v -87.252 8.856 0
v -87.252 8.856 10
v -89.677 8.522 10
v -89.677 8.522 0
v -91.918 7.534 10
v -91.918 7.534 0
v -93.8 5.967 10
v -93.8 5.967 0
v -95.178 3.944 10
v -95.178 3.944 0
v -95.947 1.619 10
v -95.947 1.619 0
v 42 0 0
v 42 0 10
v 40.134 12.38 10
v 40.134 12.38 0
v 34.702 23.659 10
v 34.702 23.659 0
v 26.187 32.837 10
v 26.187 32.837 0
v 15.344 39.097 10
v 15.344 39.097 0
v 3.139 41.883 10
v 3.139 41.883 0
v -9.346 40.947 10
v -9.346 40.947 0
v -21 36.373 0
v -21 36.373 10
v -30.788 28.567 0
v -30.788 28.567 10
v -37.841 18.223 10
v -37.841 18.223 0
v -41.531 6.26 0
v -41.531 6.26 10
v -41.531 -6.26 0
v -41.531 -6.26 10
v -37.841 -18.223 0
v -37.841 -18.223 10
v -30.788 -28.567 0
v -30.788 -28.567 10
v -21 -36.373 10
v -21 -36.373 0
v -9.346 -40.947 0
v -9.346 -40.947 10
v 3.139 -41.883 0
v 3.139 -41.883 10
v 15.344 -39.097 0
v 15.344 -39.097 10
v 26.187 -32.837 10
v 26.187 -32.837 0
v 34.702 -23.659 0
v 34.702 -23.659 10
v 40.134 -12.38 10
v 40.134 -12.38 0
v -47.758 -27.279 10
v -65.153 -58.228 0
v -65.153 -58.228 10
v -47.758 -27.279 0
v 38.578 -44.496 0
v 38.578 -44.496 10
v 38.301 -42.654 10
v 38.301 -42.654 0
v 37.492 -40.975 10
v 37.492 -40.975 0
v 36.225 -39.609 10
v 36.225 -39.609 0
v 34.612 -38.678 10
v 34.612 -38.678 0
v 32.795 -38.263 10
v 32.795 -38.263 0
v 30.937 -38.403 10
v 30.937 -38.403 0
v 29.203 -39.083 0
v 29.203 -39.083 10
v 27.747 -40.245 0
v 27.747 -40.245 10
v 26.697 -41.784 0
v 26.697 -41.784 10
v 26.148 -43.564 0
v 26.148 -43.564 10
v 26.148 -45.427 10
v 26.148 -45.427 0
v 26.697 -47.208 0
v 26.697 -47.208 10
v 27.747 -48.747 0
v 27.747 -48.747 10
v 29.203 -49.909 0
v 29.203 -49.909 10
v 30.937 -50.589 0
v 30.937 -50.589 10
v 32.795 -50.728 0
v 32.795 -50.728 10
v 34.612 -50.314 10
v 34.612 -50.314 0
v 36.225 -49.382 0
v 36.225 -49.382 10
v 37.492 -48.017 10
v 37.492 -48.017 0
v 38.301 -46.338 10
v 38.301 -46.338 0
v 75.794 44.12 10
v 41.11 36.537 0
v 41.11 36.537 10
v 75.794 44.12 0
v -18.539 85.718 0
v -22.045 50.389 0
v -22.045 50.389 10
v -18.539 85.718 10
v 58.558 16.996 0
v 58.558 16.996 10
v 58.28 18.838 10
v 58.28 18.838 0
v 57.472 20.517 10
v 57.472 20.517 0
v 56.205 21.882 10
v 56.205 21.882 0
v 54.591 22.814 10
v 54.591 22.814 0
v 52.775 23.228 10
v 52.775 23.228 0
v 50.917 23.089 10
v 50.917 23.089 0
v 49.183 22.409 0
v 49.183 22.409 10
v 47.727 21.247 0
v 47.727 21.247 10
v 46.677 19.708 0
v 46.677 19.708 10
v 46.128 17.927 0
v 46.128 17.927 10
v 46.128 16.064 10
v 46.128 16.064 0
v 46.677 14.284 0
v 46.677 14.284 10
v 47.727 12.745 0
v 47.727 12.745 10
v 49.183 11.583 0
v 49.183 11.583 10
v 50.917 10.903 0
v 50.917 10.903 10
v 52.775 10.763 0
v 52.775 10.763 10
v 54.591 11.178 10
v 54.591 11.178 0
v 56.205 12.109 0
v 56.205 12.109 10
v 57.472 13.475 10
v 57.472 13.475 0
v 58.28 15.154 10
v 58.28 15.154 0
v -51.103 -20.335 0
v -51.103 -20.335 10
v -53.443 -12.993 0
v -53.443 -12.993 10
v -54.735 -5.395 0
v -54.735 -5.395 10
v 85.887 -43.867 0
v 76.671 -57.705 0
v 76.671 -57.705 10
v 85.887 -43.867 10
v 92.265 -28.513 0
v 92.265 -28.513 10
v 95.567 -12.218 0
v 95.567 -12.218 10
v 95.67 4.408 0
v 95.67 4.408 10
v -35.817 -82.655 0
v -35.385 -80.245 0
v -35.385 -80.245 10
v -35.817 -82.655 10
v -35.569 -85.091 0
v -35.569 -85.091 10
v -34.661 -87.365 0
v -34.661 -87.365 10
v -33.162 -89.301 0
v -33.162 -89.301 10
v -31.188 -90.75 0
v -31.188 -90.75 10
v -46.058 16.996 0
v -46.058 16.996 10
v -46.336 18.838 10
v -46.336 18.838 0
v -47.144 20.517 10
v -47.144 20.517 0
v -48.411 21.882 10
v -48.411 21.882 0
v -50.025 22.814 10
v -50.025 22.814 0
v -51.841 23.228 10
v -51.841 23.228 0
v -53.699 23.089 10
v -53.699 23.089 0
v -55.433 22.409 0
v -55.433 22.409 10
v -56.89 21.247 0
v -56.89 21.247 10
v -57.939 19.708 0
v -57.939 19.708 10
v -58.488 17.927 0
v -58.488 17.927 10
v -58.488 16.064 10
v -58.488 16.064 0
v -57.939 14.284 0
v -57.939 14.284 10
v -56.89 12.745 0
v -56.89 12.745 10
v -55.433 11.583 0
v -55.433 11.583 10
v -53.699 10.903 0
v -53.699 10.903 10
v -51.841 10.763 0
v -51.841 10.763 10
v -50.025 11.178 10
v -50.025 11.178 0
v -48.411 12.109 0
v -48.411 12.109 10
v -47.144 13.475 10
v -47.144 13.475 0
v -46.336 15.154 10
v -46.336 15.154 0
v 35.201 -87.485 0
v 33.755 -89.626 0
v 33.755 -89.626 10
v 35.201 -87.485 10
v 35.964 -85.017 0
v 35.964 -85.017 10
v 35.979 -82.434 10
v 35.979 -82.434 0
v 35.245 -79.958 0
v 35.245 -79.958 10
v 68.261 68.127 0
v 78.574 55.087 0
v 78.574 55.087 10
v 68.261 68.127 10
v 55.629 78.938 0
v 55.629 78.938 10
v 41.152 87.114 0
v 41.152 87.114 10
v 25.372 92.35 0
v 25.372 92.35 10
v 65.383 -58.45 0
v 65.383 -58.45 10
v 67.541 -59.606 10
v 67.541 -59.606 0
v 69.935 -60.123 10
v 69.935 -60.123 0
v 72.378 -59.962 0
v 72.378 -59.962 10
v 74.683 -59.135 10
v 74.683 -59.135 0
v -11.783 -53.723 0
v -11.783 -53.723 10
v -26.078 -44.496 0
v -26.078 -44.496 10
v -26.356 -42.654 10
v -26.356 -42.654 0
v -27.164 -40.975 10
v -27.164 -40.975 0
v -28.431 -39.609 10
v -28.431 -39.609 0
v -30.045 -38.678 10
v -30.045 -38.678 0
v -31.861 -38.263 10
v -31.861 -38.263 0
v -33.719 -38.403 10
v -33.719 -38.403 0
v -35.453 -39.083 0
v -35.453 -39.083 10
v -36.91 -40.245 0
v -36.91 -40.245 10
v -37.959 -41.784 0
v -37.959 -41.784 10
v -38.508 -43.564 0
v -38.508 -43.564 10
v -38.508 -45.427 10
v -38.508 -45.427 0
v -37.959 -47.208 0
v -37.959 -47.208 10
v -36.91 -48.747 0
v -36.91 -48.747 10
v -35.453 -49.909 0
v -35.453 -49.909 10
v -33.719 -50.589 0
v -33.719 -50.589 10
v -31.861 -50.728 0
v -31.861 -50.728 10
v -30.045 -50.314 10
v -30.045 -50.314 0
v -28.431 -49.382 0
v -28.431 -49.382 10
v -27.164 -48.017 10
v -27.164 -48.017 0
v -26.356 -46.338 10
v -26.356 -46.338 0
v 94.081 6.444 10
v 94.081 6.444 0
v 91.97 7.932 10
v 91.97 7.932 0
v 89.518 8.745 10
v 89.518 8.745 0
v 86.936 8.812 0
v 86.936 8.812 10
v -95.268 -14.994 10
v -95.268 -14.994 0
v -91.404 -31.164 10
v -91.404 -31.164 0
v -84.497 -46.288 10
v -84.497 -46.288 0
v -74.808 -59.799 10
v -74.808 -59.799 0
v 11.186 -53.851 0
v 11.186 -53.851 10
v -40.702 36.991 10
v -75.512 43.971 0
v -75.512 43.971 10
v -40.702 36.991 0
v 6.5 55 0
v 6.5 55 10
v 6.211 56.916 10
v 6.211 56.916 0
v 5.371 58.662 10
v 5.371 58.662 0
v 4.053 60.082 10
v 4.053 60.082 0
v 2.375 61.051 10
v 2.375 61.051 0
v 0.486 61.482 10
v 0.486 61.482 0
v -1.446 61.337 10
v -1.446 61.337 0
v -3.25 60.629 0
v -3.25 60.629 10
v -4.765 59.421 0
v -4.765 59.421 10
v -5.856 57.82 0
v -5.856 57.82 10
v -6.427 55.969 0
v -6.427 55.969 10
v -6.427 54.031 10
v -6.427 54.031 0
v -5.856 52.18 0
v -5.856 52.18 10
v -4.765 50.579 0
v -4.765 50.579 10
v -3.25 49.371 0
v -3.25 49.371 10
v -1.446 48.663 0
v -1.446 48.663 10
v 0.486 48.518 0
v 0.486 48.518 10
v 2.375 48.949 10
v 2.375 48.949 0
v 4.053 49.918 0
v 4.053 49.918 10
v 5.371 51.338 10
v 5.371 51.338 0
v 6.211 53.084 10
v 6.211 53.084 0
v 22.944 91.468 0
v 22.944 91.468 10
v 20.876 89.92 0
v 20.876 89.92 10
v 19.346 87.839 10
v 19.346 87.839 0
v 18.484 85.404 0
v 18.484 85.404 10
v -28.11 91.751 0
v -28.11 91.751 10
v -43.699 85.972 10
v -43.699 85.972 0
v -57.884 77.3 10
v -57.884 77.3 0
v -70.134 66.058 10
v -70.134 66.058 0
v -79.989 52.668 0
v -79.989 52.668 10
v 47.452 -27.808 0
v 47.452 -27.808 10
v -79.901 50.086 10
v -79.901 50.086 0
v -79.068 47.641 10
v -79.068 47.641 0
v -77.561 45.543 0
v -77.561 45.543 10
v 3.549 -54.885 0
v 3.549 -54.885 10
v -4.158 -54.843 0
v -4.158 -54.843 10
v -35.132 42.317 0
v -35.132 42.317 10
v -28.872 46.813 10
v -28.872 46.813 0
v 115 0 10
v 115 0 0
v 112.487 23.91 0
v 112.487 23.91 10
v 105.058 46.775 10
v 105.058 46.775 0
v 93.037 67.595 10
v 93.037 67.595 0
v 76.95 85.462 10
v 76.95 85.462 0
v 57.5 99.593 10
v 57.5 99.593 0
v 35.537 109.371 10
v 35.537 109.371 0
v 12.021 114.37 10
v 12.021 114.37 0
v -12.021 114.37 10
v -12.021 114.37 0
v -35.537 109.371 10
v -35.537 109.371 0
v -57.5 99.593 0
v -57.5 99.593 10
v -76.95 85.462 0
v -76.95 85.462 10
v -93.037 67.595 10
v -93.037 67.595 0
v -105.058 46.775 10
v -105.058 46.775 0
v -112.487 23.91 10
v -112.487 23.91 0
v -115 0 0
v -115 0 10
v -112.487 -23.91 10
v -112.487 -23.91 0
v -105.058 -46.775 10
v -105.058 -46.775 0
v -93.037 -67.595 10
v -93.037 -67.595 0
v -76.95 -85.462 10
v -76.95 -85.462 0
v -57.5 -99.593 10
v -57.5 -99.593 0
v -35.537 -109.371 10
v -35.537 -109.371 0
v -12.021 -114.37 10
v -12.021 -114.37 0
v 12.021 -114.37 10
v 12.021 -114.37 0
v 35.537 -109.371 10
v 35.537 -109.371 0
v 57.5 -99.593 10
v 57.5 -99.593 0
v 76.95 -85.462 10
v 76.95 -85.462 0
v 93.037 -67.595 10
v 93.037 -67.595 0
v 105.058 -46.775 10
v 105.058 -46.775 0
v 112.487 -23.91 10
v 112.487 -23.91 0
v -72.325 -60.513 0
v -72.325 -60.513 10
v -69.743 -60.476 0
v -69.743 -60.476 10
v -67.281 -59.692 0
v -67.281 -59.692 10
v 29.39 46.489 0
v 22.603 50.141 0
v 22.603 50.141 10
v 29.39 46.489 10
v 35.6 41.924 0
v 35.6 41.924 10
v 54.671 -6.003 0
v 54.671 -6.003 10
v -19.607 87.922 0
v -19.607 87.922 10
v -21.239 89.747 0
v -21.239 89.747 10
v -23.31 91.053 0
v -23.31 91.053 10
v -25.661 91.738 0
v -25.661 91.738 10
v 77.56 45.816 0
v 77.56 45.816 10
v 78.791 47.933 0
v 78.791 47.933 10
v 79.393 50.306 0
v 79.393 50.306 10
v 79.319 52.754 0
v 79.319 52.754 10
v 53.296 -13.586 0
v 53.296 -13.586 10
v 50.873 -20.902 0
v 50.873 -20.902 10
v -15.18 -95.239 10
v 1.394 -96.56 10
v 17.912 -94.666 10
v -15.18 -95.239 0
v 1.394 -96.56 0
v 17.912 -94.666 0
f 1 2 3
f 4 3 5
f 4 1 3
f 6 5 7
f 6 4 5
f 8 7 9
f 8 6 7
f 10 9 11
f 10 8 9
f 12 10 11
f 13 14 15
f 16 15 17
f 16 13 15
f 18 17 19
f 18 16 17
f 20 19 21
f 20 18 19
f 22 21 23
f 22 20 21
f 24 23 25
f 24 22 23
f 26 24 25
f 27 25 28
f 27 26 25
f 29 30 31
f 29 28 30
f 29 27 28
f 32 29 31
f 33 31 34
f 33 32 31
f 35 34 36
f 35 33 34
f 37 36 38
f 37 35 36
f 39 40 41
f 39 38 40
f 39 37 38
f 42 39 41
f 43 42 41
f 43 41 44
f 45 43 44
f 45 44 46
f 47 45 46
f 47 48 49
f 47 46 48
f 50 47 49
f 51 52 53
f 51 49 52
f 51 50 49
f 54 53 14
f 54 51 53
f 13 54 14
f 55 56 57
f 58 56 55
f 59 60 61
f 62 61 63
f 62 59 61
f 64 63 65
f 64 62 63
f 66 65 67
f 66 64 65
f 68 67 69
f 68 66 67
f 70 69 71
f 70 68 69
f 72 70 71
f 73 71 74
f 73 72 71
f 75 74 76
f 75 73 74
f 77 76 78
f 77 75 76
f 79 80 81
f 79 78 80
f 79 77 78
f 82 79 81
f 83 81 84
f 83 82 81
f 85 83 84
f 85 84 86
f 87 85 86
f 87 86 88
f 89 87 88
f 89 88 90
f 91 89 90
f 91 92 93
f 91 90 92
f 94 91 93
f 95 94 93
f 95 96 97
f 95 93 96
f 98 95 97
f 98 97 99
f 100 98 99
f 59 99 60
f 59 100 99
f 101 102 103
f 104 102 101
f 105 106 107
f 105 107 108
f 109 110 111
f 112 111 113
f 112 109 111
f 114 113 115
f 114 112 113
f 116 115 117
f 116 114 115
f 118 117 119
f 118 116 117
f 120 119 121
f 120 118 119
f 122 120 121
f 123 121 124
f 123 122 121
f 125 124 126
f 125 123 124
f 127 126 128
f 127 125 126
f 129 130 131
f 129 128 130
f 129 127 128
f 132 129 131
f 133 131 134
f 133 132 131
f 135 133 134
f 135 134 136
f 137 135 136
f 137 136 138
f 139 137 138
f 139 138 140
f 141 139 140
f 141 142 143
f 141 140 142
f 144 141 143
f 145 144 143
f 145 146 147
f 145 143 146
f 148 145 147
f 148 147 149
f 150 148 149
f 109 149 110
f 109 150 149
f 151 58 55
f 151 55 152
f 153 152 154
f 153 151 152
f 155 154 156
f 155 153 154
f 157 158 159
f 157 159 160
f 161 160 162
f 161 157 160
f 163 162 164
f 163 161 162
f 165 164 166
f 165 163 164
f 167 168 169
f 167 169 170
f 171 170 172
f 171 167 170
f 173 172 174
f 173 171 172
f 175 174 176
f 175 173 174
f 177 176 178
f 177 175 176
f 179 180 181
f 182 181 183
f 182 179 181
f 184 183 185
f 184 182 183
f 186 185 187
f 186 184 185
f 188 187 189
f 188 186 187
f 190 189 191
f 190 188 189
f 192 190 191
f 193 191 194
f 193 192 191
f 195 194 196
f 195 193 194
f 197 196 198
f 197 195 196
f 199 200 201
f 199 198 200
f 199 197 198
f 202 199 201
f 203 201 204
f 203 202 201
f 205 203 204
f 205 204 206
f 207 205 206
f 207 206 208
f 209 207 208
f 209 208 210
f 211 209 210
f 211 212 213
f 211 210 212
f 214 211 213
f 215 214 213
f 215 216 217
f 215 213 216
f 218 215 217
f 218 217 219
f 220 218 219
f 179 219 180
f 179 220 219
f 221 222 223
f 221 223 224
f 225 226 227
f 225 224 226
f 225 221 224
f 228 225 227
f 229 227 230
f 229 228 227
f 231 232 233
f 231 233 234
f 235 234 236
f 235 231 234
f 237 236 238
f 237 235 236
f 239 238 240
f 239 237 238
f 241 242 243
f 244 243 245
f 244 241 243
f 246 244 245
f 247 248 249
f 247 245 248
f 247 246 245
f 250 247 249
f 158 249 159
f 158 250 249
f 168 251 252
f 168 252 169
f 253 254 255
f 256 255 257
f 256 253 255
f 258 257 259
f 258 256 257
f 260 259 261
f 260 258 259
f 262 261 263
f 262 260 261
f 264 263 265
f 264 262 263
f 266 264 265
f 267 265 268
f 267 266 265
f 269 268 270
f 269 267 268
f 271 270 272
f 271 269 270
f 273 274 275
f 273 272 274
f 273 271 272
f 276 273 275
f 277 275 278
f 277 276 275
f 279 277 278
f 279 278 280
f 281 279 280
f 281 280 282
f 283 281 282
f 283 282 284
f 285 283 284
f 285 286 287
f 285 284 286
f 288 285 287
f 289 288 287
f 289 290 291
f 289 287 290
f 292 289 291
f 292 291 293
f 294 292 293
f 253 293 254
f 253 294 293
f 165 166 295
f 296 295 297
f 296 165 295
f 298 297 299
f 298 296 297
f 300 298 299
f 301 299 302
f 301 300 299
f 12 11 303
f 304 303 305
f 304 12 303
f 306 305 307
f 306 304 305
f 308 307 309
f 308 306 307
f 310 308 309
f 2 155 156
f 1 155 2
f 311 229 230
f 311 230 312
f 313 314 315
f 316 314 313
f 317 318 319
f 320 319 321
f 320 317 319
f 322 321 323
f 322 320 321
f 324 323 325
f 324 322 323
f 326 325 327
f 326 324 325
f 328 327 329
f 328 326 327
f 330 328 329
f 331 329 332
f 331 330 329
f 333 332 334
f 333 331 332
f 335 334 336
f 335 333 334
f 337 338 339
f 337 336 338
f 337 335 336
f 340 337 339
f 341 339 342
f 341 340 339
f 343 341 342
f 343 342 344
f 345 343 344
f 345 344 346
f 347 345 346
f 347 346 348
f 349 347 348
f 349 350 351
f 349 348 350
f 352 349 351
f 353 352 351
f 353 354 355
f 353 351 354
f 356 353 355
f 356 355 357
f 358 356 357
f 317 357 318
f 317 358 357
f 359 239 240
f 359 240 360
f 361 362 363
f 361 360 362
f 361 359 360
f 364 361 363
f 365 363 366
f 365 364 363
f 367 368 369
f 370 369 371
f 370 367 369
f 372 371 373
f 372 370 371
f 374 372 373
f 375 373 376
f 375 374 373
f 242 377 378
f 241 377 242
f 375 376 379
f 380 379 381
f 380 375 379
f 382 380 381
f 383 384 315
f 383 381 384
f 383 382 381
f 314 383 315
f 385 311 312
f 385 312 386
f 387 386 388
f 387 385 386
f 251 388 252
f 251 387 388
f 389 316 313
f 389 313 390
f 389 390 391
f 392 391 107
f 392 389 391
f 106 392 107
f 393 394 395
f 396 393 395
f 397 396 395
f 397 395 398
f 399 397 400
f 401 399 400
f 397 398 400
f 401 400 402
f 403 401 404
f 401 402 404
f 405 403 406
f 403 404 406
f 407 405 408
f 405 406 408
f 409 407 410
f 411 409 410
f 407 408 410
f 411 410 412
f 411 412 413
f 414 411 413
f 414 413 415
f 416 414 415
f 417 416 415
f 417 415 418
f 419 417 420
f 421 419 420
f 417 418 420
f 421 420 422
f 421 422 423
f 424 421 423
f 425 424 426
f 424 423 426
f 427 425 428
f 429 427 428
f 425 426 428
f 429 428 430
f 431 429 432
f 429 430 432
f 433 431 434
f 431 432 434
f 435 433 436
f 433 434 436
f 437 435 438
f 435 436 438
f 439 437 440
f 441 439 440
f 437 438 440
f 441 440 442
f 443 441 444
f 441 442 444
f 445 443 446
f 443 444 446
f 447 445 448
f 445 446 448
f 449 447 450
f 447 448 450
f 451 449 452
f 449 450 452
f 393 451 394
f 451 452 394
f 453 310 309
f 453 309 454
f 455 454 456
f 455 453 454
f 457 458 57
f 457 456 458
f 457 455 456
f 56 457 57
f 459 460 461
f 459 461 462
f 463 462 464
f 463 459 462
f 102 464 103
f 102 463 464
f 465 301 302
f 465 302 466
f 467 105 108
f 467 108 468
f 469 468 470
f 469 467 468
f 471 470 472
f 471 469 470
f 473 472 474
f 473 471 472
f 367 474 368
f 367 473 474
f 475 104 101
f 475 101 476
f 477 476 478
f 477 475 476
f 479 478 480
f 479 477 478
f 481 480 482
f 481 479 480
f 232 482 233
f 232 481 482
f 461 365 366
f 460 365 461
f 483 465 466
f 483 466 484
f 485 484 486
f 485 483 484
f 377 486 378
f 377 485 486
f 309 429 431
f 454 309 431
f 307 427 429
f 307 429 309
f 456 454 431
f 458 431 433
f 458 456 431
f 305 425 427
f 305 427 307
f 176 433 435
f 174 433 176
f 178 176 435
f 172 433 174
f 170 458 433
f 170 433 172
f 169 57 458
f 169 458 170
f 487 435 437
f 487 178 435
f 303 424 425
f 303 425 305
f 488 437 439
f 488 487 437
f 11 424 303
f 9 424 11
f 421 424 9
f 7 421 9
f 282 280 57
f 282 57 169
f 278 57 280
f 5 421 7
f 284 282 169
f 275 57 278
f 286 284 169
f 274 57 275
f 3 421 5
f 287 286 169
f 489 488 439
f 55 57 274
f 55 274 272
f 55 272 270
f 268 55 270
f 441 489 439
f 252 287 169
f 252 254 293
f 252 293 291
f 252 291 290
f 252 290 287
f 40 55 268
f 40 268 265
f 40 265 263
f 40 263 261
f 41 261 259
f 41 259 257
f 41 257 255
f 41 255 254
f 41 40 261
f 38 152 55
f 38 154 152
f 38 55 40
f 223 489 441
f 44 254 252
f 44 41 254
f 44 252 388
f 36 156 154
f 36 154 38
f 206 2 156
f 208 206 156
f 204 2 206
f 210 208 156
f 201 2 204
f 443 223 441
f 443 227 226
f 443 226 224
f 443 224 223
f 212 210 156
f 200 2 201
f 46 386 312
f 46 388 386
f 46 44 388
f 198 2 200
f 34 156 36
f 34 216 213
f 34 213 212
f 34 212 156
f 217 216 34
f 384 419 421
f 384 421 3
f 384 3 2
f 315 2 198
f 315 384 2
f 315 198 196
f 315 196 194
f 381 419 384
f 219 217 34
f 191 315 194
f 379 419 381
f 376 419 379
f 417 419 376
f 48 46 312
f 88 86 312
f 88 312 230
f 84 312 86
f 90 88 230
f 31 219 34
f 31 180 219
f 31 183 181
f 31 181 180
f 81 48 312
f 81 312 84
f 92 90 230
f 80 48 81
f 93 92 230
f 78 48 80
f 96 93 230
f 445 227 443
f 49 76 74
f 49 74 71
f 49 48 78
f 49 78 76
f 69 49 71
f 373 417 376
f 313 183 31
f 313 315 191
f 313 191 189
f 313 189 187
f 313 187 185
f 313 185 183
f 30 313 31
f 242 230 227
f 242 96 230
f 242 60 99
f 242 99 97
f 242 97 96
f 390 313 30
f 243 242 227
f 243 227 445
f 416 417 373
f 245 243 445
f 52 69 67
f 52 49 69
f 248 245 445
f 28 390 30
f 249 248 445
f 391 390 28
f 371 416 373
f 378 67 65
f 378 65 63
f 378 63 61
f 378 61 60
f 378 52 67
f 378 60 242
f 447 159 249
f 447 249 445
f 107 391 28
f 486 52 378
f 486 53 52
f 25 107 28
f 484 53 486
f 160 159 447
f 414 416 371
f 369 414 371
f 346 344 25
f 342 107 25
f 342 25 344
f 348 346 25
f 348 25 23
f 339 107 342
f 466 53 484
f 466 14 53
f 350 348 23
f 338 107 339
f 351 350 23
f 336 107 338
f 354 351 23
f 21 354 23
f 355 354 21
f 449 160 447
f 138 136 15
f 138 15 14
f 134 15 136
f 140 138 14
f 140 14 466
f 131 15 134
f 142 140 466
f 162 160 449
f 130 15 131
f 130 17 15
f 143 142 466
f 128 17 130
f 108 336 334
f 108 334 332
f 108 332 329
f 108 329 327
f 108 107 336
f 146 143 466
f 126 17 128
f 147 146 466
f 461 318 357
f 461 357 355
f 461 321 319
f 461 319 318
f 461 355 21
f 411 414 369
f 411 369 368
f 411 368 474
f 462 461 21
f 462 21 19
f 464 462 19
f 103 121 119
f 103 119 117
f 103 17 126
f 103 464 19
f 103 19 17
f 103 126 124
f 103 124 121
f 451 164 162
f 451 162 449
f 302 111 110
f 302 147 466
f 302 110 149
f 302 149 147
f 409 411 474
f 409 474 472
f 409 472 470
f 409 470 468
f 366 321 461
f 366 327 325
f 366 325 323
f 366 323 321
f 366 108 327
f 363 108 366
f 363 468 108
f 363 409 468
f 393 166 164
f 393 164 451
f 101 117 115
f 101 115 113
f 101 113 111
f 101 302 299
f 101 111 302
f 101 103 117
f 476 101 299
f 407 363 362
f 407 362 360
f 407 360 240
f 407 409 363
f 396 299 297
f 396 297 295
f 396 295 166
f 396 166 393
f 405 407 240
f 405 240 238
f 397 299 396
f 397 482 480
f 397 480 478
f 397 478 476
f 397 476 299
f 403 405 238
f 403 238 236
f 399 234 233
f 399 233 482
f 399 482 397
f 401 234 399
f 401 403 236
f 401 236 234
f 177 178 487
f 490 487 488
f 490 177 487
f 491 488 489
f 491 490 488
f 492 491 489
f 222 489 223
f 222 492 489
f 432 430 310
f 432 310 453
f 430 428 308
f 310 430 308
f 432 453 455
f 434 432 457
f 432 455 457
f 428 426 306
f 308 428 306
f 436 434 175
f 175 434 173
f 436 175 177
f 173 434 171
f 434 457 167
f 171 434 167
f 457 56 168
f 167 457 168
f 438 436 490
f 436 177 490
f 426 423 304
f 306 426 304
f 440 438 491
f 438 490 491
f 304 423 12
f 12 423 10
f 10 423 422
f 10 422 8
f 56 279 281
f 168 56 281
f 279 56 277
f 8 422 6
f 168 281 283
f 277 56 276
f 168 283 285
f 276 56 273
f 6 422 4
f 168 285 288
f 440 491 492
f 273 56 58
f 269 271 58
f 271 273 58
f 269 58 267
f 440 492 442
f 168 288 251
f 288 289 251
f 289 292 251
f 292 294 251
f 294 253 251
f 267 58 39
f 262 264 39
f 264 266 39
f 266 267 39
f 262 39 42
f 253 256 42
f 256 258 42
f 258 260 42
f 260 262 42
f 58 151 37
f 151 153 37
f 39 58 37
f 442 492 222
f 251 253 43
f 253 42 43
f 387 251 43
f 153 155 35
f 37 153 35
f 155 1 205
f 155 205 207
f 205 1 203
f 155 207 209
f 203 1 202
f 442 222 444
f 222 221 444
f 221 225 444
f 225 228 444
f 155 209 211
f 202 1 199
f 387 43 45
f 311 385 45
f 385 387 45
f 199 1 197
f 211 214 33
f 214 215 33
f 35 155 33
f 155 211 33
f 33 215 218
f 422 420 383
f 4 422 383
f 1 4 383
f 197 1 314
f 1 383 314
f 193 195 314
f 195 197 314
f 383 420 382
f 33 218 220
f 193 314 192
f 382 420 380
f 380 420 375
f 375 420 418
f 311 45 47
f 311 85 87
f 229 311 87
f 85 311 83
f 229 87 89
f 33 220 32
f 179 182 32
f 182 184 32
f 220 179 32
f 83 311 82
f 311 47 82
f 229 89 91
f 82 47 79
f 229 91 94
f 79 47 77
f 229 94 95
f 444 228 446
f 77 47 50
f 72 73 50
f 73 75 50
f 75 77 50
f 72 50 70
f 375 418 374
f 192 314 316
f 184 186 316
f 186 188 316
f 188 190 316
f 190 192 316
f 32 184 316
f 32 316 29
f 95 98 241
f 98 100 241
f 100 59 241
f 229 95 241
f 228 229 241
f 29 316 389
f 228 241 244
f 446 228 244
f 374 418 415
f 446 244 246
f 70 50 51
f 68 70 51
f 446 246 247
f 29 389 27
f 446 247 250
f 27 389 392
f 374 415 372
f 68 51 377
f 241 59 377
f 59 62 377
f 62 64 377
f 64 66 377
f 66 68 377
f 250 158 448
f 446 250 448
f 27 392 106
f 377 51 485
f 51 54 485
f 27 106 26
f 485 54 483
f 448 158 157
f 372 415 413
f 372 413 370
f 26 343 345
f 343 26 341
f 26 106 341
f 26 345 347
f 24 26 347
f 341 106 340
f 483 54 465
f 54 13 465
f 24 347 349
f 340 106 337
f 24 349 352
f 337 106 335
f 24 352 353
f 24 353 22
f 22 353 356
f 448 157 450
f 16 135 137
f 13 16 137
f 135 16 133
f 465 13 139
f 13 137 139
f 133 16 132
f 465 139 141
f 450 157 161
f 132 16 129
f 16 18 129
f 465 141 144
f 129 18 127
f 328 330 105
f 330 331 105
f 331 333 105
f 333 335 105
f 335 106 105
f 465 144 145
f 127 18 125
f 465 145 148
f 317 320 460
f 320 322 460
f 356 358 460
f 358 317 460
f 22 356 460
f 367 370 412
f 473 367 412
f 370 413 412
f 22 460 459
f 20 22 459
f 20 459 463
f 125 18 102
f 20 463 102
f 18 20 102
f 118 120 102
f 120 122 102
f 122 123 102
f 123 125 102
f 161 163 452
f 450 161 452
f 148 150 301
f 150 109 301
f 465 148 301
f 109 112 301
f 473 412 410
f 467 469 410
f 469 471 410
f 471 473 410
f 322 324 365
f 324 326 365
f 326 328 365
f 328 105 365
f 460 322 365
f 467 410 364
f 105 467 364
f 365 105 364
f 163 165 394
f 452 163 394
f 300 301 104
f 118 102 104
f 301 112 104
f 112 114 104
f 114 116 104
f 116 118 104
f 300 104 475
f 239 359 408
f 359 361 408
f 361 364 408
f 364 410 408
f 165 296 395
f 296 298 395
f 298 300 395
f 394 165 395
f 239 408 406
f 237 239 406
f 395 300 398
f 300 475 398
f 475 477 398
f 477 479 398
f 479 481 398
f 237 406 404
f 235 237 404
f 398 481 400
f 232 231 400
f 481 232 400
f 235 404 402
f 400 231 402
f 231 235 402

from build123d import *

# Parameters (mm, degrees)
SKETCH1_R           = 115
BOSS_EXTRUDE1_DEPTH = 10
SKETCH3_R           = 6.25
SKETCH3_R_2         = 6.5
SKETCH3_R_3         = 42
CUT_EXTRUDE2_DEPTH  = 163.941707368


with BuildPart() as part:
    # Sketch1 → Boss-Extrude1 (new body)
    with BuildSketch(Plane.XY):
        Circle(SKETCH1_R)
    extrude(amount=BOSS_EXTRUDE1_DEPTH)

    # Sketch3 → Cut-Extrude2 (cut, through all)
    with BuildSketch(Plane.XY):
        with BuildLine():
            Line((18.484325558, 85.403687954), (22.603174126, 50.140767041))
            ThreePointArc((22.603174126, 50.140767041), (32.574916184, 44.315627442), (41.110477128, 36.536675688))
            Line((41.110477128, 36.536675688), (75.793703221, 44.120364278))
            ThreePointArc((75.793703221, 44.120364278), (79.175021421, 49.09862209), (78.573775649, 55.086515471))
            ThreePointArc((78.573775649, 55.086515471), (55.629022762, 78.938176107), (25.371814654, 92.349542839))
            ThreePointArc((25.371814654, 92.349542839), (20.87622799, 89.919618918), (18.484325558, 85.403687954))
        make_face()
        with BuildLine():
            ThreePointArc((-40.701938294, 36.991245168), (-32.080463562, 44.674868301), (-22.044607418, 50.388840866))
            Line((-22.044607418, 50.388840866), (-18.539417586, 85.718037702))
            ThreePointArc((-18.539417586, 85.718037702), (-22.229137331, 90.472228676), (-28.109757511, 91.750770782))
            ThreePointArc((-28.109757511, 91.750770782), (-57.884353357, 77.299582515), (-79.989312588, 52.667607817))
            ThreePointArc((-79.989312588, 52.667607817), (-79.067530287, 47.641163039), (-75.511763217, 43.970829232))
            Line((-75.511763217, 43.970829232), (-40.701938294, 36.991245168))
        make_face()
        with BuildLine():
            ThreePointArc((-47.7583554, -27.278920241), (-52.40173304, -16.70504039), (-54.73479378, -5.394659379))
            Line((-54.73479378, -5.394659379), (-87.251693421, 8.856296471))
            ThreePointArc((-87.251693421, 8.856296471), (-92.913383832, 6.81629027), (-95.946561206, 1.618579367))
            ThreePointArc((-95.946561206, 1.618579367), (-91.403520553, -31.164406796), (-74.80792857, -59.799171102))
            ThreePointArc((-74.80792857, -59.799171102), (-69.742649114, -60.475760896), (-65.153161777, -58.228220975))
            Line((-65.153161777, -58.228220975), (-47.7583554, -27.278920241))
        make_face()
        with BuildLine():
            ThreePointArc((11.18565141, -53.850545053), (-0.305588527, -54.999151045), (-11.783355506, -53.72292372))
            Line((-11.783355506, -53.72292372), (-35.385094524, -80.244545469))
            ThreePointArc((-35.385094524, -80.244545469), (-35.194491887, -86.259529612), (-31.188478418, -90.75043372))
            ThreePointArc((-31.188478418, -90.75043372), (1.393870963, -96.560245154), (33.755470104, -89.625528057))
            ThreePointArc((33.755470104, -89.625528057), (35.964202669, -85.017238768), (35.244894765, -79.957848899))
            Line((35.244894765, -79.957848899), (11.18565141, -53.850545053))
        make_face()
        with BuildLine():
            Line((86.935704672, 8.811552688), (54.671468158, -6.002546915))
            ThreePointArc((54.671468158, -6.002546915), (52.212868944, -17.286304309), (47.452279576, -27.807933455))
            Line((47.452279576, -27.807933455), (65.38250231, -58.450152982))
            ThreePointArc((65.38250231, -58.450152982), (71.161991629, -60.127611424), (76.671021486, -57.7054319))
            ThreePointArc((76.671021486, -57.7054319), (92.264980185, -28.513106671), (95.6699564, 4.407548503))
            ThreePointArc((95.6699564, 4.407548503), (91.969748742, 7.932217708), (86.935704672, 8.811552688))
        make_face()
        with Locations((52.308108396, 16.995934691)):
            Circle(SKETCH3_R)
        with Locations((0, 55)):
            Circle(SKETCH3_R_2)
        with Locations((-52.308108396, 16.995934691)):
            Circle(SKETCH3_R)
        with Locations((-32.328188876, -44.495934691)):
            Circle(SKETCH3_R)
        with Locations((32.328188876, -44.495934691)):
            Circle(SKETCH3_R)
        Circle(SKETCH3_R_3)
    extrude(amount=CUT_EXTRUDE2_DEPTH, mode=Mode.SUBTRACT)


solid = part.part
